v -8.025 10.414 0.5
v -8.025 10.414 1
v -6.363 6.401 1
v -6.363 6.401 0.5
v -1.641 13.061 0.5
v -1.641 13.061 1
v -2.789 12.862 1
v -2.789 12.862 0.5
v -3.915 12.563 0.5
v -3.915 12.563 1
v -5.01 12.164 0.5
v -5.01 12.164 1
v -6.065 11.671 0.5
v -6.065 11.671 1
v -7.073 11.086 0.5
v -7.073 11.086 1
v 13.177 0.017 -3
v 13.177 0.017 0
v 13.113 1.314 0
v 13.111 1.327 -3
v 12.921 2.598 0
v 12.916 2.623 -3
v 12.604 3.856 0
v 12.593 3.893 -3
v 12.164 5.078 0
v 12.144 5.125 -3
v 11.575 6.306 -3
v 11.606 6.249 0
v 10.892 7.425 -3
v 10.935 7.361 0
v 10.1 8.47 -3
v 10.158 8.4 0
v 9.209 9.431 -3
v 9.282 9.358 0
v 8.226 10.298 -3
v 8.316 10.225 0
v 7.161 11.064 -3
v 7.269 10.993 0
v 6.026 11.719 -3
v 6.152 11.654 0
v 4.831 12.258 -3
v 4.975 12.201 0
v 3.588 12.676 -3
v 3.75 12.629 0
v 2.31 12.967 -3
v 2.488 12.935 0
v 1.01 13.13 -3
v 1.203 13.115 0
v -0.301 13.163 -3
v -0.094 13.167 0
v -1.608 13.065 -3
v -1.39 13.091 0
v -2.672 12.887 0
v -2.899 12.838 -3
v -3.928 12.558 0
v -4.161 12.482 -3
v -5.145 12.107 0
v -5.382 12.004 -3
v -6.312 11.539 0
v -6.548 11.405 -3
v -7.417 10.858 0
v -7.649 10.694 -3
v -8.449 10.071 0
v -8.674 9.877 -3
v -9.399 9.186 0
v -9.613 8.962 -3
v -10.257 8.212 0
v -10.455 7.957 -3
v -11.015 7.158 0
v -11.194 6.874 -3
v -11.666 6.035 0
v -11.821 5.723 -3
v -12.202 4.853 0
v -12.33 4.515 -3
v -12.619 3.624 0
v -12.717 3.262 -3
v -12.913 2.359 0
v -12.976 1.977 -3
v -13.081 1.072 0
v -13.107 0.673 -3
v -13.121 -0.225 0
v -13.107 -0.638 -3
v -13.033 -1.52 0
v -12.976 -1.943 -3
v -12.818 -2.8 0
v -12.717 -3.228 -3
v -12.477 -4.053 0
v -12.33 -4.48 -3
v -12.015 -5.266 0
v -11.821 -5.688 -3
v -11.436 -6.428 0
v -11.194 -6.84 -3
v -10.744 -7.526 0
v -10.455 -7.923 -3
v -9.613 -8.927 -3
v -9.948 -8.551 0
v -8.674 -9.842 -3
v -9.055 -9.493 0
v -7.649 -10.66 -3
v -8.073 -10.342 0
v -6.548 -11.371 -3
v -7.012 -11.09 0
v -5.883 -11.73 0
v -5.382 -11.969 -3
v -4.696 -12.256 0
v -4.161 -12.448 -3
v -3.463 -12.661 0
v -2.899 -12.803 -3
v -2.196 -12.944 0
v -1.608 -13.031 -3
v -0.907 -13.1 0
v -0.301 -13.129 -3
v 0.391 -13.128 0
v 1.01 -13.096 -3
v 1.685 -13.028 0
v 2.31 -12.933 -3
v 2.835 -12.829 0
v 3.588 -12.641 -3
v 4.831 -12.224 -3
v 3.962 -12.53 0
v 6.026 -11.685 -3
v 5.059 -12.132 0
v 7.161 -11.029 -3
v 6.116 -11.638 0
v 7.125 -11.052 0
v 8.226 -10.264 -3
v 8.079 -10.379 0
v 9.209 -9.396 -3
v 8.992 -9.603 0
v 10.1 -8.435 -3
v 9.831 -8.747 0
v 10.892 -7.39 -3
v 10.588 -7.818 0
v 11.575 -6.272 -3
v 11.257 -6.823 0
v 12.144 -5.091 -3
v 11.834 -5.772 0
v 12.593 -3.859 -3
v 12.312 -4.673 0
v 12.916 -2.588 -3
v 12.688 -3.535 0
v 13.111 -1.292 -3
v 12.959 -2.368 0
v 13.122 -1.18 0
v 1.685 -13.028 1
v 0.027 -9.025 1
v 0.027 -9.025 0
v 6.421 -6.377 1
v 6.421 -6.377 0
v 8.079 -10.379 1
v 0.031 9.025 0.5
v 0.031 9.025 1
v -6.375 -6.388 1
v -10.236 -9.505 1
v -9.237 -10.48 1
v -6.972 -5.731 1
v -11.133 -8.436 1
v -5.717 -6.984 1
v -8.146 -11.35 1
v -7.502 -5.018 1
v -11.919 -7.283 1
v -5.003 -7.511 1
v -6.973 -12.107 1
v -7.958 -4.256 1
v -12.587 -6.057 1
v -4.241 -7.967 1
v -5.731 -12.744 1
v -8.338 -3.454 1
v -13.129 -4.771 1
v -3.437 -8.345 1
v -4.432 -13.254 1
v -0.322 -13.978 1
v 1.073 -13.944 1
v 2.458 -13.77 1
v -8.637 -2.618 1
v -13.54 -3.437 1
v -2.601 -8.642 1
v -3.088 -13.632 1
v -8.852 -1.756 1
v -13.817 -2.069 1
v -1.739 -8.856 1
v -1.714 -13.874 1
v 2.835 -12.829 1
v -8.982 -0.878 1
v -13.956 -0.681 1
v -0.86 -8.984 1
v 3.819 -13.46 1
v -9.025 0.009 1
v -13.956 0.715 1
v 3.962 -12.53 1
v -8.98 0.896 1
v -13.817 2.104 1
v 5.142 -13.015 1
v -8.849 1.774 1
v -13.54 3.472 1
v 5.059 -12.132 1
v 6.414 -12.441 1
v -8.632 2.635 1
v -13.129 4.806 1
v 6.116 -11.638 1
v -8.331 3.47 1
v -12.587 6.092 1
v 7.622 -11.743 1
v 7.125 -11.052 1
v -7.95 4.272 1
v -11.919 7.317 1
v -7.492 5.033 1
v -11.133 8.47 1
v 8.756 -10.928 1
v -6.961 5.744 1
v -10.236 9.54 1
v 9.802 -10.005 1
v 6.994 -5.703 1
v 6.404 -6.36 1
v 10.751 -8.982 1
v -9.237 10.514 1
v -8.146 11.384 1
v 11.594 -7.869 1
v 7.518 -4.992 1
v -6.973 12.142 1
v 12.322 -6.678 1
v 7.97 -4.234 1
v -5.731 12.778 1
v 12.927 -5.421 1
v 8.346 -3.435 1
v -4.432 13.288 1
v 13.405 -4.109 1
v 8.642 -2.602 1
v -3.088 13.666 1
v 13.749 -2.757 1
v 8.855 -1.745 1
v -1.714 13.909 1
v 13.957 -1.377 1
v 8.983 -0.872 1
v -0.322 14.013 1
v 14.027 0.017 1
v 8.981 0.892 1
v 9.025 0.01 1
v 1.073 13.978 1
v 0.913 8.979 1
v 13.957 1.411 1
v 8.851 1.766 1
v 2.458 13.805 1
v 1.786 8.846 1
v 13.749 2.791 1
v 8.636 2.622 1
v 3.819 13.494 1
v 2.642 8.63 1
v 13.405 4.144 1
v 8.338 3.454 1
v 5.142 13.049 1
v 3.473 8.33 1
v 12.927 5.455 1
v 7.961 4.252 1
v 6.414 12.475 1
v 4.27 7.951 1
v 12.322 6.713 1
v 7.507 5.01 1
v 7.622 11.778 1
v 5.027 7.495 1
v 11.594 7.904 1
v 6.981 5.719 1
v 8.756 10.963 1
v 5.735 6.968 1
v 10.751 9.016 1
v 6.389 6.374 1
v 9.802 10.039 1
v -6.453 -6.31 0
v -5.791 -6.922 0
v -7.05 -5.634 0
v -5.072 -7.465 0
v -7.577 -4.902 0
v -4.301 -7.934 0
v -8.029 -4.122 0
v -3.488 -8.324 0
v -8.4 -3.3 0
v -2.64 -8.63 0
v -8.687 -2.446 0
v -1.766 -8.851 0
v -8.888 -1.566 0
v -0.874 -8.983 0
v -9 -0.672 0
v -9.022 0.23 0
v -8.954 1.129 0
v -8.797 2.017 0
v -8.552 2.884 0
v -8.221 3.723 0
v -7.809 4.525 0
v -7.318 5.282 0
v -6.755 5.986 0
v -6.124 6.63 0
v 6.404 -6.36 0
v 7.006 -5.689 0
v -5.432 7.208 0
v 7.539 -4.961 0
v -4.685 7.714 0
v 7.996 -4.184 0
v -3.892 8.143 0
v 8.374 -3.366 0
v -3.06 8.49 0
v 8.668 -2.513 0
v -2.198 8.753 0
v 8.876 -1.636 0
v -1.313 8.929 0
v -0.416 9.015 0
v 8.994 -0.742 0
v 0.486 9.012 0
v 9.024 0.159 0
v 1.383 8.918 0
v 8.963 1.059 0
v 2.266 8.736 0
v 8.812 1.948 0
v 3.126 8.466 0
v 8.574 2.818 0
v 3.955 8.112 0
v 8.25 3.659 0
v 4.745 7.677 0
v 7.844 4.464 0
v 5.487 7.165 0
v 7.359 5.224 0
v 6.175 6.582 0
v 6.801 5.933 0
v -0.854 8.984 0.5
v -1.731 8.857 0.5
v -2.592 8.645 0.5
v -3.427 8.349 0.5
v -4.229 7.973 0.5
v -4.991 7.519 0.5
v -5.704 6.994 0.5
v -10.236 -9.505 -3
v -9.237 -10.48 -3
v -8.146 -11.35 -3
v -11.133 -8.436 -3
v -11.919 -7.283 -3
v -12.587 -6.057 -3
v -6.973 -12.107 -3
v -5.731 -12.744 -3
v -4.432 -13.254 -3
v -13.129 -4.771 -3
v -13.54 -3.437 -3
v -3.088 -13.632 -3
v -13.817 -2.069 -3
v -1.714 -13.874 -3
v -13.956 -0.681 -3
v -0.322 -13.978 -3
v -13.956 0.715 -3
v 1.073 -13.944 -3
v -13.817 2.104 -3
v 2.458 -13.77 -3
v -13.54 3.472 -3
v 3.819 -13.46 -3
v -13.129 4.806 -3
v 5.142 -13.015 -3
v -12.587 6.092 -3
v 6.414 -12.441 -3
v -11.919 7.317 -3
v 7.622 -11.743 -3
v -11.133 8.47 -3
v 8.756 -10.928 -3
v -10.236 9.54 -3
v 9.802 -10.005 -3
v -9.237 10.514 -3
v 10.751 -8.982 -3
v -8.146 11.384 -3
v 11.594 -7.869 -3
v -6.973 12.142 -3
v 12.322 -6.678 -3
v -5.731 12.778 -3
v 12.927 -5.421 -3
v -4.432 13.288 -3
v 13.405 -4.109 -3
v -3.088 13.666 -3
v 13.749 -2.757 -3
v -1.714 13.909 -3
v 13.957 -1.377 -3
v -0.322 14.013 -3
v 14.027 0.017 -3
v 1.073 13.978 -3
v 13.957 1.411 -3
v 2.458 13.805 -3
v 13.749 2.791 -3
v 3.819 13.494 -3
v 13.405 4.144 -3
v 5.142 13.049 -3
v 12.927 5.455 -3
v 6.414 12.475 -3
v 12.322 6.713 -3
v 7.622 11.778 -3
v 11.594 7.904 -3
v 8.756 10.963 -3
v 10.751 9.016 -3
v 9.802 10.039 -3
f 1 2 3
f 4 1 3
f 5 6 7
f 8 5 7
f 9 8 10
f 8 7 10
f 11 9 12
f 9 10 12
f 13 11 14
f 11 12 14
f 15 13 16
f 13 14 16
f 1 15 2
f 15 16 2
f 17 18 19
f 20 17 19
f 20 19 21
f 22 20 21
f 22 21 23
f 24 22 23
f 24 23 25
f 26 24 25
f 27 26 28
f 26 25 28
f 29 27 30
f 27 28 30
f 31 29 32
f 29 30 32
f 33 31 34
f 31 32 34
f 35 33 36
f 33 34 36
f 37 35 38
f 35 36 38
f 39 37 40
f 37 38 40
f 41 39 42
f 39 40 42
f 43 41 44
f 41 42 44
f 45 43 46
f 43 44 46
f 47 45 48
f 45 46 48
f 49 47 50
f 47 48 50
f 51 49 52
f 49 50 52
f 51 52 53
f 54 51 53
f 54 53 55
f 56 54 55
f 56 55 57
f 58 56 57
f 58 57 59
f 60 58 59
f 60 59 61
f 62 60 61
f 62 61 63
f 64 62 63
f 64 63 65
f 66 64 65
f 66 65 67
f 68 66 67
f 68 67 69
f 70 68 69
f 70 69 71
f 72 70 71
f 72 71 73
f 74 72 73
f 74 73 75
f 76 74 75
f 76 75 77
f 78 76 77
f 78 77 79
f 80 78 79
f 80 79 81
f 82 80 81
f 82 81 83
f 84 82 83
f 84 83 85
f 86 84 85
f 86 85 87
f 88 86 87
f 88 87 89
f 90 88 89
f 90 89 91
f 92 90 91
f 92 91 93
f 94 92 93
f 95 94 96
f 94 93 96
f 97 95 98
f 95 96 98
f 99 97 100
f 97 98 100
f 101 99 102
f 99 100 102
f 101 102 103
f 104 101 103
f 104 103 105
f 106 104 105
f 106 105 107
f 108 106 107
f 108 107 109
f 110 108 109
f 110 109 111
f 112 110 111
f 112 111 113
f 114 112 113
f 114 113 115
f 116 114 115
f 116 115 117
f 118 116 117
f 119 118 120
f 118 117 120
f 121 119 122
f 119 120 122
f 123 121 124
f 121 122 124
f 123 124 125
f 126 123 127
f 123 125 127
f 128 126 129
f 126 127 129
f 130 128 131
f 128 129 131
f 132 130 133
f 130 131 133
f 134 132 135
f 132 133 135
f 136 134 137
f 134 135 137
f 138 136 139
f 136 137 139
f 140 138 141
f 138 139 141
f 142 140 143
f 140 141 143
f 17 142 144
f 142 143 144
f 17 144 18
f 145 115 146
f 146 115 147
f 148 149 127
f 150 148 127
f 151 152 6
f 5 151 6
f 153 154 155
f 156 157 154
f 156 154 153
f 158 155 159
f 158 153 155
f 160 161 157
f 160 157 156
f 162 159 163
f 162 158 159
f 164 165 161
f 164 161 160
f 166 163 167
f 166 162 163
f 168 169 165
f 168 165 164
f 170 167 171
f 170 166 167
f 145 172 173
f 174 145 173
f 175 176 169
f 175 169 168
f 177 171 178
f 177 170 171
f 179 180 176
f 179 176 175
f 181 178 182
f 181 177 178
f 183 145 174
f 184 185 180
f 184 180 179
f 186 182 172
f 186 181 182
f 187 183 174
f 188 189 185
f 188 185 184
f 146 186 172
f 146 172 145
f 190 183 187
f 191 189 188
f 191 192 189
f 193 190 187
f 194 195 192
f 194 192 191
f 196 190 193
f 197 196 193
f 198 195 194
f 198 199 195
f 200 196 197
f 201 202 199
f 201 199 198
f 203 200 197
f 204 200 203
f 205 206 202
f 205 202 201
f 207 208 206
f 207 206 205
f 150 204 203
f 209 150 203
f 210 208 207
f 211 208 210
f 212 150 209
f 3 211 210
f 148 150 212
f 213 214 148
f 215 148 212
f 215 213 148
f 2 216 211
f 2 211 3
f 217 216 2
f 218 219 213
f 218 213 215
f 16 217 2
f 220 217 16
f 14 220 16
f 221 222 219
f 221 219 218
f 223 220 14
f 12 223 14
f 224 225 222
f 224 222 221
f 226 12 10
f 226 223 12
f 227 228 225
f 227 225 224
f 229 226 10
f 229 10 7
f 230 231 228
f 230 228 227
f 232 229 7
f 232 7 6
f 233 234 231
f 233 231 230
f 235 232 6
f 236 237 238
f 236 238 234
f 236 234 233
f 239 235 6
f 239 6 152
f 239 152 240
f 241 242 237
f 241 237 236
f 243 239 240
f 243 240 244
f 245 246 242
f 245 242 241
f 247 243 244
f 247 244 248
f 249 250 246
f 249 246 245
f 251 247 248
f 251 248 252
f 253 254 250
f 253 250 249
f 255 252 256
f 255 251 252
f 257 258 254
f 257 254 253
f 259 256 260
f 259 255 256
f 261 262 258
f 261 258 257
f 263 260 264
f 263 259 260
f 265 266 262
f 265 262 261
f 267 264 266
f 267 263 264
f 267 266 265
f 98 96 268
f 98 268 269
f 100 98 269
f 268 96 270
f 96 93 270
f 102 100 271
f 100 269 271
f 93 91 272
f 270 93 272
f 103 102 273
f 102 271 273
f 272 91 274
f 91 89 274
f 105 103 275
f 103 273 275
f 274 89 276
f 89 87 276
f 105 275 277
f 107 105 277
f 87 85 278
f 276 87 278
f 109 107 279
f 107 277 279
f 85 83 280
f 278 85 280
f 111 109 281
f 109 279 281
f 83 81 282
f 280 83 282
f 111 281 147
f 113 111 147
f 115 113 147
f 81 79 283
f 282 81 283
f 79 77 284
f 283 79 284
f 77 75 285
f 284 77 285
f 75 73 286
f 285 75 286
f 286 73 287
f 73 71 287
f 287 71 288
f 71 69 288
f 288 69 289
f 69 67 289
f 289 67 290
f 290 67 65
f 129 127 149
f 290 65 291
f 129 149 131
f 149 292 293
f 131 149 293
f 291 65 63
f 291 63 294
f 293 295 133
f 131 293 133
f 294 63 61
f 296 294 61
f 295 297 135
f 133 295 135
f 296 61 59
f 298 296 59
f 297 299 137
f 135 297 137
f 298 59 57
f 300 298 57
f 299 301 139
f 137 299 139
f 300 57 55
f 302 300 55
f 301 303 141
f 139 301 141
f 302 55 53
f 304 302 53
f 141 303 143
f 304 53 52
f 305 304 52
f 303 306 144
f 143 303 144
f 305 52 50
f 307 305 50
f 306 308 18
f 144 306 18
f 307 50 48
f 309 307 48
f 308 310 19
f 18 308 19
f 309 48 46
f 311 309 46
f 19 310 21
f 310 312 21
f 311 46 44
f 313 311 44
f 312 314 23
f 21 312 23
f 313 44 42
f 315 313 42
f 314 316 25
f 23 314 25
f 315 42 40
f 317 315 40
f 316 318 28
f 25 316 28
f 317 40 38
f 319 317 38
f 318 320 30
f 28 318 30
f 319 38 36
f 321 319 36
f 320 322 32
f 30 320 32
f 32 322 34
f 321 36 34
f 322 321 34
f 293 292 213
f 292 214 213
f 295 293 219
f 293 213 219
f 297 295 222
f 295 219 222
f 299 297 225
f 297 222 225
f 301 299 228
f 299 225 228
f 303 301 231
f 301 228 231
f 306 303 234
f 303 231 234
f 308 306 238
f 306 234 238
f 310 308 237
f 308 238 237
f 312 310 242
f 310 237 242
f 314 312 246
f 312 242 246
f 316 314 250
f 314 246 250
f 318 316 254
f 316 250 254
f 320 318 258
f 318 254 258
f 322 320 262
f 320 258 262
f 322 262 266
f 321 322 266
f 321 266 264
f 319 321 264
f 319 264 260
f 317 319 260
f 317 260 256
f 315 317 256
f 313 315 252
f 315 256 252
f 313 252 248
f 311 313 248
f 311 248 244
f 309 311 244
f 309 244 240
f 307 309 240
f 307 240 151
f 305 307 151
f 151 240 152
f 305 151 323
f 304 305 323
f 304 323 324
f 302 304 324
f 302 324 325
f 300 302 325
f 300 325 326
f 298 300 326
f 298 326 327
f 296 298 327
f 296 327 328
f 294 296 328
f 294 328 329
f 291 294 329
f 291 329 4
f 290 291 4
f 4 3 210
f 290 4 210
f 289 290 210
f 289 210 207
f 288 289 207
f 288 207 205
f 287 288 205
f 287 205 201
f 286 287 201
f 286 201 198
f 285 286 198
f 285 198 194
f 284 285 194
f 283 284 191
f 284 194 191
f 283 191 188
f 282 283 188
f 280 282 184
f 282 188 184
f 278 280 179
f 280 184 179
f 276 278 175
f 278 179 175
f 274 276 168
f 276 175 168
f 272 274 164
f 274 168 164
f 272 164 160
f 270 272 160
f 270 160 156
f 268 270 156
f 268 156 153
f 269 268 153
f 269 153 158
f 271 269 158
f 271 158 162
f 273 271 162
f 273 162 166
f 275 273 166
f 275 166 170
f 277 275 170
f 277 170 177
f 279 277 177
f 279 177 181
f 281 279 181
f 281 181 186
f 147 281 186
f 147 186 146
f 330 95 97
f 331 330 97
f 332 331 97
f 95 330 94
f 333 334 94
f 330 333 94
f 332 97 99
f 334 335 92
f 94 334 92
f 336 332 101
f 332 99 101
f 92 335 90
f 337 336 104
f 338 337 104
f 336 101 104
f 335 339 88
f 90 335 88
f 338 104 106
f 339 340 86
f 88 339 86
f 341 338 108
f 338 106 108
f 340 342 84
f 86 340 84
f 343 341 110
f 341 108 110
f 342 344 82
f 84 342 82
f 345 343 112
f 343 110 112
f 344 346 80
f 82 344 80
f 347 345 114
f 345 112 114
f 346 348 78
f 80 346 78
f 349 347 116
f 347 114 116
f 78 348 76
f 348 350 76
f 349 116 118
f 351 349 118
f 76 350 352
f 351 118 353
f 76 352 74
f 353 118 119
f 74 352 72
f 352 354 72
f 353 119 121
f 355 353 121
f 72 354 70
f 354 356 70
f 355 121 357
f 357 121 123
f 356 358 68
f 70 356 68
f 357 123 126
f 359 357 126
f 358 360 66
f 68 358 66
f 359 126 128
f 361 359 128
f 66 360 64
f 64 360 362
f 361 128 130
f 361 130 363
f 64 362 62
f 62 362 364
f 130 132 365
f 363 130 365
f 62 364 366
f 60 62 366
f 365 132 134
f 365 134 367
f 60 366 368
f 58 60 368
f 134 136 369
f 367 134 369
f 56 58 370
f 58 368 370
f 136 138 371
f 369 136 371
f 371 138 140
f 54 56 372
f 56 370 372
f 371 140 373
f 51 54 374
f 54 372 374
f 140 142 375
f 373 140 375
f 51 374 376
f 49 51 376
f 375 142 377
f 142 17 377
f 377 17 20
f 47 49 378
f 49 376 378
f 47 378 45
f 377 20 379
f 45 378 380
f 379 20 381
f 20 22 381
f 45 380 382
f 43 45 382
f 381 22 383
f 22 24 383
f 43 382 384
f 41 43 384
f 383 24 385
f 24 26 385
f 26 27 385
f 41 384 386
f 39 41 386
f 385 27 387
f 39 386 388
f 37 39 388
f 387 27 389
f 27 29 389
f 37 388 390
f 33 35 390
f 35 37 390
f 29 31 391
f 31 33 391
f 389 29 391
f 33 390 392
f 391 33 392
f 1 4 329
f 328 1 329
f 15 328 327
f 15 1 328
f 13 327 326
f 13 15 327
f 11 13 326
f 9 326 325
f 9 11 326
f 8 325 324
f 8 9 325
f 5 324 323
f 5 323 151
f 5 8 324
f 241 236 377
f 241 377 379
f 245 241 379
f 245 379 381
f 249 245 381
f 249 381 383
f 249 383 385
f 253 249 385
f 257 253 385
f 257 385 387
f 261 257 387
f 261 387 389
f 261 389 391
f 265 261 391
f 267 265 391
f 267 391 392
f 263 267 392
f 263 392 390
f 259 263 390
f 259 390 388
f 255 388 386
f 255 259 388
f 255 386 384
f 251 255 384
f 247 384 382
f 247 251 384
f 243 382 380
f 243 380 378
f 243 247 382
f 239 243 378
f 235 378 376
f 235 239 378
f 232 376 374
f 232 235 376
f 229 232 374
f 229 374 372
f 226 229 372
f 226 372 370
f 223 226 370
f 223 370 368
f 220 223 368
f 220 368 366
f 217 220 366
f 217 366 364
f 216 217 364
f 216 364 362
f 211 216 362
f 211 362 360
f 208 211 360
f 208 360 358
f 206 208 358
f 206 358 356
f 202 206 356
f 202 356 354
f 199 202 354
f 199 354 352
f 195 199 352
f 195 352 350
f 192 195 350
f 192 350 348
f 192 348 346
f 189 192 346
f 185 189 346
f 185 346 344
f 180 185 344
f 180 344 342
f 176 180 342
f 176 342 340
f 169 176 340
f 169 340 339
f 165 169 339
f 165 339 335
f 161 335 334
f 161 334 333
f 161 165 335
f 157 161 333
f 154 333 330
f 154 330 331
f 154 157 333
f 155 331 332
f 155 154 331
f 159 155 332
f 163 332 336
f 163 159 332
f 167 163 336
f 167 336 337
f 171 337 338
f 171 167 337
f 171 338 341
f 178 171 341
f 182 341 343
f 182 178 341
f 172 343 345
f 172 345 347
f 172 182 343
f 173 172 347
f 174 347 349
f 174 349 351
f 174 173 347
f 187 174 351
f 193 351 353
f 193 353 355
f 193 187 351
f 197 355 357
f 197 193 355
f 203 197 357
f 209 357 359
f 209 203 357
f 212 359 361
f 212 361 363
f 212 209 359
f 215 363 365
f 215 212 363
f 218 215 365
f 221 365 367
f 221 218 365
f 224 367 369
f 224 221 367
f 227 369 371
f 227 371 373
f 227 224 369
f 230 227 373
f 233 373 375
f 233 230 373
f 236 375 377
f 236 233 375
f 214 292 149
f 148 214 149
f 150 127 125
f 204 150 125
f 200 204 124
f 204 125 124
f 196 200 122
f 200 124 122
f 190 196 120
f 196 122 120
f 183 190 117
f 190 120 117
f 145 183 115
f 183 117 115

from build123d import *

# Parameters (mm, degrees)
SKETCH1_R           = 14
SKETCH1_R_2         = 13.15
BOSS_EXTRUDE1_DEPTH = 3
BOSS_EXTRUDE2_START = 1
SKETCH2_R           = 14
SKETCH2_R_2         = 9.025
BOSS_EXTRUDE2_DEPTH = 1
CUT_EXTRUDE1_DEPTH  = 21.055785441
CUT_EXTRUDE2_DEPTH  = 0.5


with BuildPart() as part:
    # Sketch1 → Boss-Extrude1 (new body)
    with BuildSketch(Plane.XY):
        with Locations((0.026824761, 0.017229283)):
            Circle(SKETCH1_R)
        with Locations((0.026824761, 0.017229283)):
            Circle(SKETCH1_R_2, mode=Mode.SUBTRACT)
    extrude(amount=-BOSS_EXTRUDE1_DEPTH)

    # Sketch2 → Boss-Extrude2 (add)
    with BuildSketch(Plane.XY.offset(BOSS_EXTRUDE2_START)):
        with Locations((0.026824761, 0.017229283)):
            Circle(SKETCH2_R)
        Circle(SKETCH2_R_2, mode=Mode.SUBTRACT)
    extrude(amount=-BOSS_EXTRUDE2_DEPTH)

    # Sketch3 → Cut-Extrude1 (cut, through all)
    with BuildSketch(Plane(origin=(0, 0, 0), x_dir=(-1, 0, 0), z_dir=(0, 0, -1))):
        with BuildLine():
            Line((-1.684865059, -13.02782351), (-0.026824761, -9.024960135))
            ThreePointArc((-0.026824761, -9.024960135), (-3.480481432, -8.326876605), (-6.403627708, -6.359573664))
            Line((-6.403627708, -6.359573664), (-6.420618215, -6.376564171))
            Line((-6.420618215, -6.376564171), (-8.078658513, -10.379427546))
            ThreePointArc((-8.078658513, -10.379427546), (-5.059111896, -12.131786569), (-1.684865059, -13.02782351))
        make_face()
    extrude(amount=-CUT_EXTRUDE1_DEPTH, mode=Mode.SUBTRACT)

    # Sketch4 → Cut-Extrude2 (cut)
    with BuildSketch(Plane.XY.offset(1)):
        with BuildLine():
            ThreePointArc((-6.362642541, 6.400578481), (-3.426918892, 8.349062936), (0.031150913, 9.024946239))
            Line((0.031150913, 9.024946239), (-1.640669197, 13.061077025))
            ThreePointArc((-1.640669197, 13.061077025), (-5.009864402, 12.164420822), (-8.025008992, 10.413886112))
            Line((-8.025008992, 10.413886112), (-6.362642541, 6.400578481))
        make_face()
    extrude(amount=-CUT_EXTRUDE2_DEPTH, mode=Mode.SUBTRACT)


solid = part.part
